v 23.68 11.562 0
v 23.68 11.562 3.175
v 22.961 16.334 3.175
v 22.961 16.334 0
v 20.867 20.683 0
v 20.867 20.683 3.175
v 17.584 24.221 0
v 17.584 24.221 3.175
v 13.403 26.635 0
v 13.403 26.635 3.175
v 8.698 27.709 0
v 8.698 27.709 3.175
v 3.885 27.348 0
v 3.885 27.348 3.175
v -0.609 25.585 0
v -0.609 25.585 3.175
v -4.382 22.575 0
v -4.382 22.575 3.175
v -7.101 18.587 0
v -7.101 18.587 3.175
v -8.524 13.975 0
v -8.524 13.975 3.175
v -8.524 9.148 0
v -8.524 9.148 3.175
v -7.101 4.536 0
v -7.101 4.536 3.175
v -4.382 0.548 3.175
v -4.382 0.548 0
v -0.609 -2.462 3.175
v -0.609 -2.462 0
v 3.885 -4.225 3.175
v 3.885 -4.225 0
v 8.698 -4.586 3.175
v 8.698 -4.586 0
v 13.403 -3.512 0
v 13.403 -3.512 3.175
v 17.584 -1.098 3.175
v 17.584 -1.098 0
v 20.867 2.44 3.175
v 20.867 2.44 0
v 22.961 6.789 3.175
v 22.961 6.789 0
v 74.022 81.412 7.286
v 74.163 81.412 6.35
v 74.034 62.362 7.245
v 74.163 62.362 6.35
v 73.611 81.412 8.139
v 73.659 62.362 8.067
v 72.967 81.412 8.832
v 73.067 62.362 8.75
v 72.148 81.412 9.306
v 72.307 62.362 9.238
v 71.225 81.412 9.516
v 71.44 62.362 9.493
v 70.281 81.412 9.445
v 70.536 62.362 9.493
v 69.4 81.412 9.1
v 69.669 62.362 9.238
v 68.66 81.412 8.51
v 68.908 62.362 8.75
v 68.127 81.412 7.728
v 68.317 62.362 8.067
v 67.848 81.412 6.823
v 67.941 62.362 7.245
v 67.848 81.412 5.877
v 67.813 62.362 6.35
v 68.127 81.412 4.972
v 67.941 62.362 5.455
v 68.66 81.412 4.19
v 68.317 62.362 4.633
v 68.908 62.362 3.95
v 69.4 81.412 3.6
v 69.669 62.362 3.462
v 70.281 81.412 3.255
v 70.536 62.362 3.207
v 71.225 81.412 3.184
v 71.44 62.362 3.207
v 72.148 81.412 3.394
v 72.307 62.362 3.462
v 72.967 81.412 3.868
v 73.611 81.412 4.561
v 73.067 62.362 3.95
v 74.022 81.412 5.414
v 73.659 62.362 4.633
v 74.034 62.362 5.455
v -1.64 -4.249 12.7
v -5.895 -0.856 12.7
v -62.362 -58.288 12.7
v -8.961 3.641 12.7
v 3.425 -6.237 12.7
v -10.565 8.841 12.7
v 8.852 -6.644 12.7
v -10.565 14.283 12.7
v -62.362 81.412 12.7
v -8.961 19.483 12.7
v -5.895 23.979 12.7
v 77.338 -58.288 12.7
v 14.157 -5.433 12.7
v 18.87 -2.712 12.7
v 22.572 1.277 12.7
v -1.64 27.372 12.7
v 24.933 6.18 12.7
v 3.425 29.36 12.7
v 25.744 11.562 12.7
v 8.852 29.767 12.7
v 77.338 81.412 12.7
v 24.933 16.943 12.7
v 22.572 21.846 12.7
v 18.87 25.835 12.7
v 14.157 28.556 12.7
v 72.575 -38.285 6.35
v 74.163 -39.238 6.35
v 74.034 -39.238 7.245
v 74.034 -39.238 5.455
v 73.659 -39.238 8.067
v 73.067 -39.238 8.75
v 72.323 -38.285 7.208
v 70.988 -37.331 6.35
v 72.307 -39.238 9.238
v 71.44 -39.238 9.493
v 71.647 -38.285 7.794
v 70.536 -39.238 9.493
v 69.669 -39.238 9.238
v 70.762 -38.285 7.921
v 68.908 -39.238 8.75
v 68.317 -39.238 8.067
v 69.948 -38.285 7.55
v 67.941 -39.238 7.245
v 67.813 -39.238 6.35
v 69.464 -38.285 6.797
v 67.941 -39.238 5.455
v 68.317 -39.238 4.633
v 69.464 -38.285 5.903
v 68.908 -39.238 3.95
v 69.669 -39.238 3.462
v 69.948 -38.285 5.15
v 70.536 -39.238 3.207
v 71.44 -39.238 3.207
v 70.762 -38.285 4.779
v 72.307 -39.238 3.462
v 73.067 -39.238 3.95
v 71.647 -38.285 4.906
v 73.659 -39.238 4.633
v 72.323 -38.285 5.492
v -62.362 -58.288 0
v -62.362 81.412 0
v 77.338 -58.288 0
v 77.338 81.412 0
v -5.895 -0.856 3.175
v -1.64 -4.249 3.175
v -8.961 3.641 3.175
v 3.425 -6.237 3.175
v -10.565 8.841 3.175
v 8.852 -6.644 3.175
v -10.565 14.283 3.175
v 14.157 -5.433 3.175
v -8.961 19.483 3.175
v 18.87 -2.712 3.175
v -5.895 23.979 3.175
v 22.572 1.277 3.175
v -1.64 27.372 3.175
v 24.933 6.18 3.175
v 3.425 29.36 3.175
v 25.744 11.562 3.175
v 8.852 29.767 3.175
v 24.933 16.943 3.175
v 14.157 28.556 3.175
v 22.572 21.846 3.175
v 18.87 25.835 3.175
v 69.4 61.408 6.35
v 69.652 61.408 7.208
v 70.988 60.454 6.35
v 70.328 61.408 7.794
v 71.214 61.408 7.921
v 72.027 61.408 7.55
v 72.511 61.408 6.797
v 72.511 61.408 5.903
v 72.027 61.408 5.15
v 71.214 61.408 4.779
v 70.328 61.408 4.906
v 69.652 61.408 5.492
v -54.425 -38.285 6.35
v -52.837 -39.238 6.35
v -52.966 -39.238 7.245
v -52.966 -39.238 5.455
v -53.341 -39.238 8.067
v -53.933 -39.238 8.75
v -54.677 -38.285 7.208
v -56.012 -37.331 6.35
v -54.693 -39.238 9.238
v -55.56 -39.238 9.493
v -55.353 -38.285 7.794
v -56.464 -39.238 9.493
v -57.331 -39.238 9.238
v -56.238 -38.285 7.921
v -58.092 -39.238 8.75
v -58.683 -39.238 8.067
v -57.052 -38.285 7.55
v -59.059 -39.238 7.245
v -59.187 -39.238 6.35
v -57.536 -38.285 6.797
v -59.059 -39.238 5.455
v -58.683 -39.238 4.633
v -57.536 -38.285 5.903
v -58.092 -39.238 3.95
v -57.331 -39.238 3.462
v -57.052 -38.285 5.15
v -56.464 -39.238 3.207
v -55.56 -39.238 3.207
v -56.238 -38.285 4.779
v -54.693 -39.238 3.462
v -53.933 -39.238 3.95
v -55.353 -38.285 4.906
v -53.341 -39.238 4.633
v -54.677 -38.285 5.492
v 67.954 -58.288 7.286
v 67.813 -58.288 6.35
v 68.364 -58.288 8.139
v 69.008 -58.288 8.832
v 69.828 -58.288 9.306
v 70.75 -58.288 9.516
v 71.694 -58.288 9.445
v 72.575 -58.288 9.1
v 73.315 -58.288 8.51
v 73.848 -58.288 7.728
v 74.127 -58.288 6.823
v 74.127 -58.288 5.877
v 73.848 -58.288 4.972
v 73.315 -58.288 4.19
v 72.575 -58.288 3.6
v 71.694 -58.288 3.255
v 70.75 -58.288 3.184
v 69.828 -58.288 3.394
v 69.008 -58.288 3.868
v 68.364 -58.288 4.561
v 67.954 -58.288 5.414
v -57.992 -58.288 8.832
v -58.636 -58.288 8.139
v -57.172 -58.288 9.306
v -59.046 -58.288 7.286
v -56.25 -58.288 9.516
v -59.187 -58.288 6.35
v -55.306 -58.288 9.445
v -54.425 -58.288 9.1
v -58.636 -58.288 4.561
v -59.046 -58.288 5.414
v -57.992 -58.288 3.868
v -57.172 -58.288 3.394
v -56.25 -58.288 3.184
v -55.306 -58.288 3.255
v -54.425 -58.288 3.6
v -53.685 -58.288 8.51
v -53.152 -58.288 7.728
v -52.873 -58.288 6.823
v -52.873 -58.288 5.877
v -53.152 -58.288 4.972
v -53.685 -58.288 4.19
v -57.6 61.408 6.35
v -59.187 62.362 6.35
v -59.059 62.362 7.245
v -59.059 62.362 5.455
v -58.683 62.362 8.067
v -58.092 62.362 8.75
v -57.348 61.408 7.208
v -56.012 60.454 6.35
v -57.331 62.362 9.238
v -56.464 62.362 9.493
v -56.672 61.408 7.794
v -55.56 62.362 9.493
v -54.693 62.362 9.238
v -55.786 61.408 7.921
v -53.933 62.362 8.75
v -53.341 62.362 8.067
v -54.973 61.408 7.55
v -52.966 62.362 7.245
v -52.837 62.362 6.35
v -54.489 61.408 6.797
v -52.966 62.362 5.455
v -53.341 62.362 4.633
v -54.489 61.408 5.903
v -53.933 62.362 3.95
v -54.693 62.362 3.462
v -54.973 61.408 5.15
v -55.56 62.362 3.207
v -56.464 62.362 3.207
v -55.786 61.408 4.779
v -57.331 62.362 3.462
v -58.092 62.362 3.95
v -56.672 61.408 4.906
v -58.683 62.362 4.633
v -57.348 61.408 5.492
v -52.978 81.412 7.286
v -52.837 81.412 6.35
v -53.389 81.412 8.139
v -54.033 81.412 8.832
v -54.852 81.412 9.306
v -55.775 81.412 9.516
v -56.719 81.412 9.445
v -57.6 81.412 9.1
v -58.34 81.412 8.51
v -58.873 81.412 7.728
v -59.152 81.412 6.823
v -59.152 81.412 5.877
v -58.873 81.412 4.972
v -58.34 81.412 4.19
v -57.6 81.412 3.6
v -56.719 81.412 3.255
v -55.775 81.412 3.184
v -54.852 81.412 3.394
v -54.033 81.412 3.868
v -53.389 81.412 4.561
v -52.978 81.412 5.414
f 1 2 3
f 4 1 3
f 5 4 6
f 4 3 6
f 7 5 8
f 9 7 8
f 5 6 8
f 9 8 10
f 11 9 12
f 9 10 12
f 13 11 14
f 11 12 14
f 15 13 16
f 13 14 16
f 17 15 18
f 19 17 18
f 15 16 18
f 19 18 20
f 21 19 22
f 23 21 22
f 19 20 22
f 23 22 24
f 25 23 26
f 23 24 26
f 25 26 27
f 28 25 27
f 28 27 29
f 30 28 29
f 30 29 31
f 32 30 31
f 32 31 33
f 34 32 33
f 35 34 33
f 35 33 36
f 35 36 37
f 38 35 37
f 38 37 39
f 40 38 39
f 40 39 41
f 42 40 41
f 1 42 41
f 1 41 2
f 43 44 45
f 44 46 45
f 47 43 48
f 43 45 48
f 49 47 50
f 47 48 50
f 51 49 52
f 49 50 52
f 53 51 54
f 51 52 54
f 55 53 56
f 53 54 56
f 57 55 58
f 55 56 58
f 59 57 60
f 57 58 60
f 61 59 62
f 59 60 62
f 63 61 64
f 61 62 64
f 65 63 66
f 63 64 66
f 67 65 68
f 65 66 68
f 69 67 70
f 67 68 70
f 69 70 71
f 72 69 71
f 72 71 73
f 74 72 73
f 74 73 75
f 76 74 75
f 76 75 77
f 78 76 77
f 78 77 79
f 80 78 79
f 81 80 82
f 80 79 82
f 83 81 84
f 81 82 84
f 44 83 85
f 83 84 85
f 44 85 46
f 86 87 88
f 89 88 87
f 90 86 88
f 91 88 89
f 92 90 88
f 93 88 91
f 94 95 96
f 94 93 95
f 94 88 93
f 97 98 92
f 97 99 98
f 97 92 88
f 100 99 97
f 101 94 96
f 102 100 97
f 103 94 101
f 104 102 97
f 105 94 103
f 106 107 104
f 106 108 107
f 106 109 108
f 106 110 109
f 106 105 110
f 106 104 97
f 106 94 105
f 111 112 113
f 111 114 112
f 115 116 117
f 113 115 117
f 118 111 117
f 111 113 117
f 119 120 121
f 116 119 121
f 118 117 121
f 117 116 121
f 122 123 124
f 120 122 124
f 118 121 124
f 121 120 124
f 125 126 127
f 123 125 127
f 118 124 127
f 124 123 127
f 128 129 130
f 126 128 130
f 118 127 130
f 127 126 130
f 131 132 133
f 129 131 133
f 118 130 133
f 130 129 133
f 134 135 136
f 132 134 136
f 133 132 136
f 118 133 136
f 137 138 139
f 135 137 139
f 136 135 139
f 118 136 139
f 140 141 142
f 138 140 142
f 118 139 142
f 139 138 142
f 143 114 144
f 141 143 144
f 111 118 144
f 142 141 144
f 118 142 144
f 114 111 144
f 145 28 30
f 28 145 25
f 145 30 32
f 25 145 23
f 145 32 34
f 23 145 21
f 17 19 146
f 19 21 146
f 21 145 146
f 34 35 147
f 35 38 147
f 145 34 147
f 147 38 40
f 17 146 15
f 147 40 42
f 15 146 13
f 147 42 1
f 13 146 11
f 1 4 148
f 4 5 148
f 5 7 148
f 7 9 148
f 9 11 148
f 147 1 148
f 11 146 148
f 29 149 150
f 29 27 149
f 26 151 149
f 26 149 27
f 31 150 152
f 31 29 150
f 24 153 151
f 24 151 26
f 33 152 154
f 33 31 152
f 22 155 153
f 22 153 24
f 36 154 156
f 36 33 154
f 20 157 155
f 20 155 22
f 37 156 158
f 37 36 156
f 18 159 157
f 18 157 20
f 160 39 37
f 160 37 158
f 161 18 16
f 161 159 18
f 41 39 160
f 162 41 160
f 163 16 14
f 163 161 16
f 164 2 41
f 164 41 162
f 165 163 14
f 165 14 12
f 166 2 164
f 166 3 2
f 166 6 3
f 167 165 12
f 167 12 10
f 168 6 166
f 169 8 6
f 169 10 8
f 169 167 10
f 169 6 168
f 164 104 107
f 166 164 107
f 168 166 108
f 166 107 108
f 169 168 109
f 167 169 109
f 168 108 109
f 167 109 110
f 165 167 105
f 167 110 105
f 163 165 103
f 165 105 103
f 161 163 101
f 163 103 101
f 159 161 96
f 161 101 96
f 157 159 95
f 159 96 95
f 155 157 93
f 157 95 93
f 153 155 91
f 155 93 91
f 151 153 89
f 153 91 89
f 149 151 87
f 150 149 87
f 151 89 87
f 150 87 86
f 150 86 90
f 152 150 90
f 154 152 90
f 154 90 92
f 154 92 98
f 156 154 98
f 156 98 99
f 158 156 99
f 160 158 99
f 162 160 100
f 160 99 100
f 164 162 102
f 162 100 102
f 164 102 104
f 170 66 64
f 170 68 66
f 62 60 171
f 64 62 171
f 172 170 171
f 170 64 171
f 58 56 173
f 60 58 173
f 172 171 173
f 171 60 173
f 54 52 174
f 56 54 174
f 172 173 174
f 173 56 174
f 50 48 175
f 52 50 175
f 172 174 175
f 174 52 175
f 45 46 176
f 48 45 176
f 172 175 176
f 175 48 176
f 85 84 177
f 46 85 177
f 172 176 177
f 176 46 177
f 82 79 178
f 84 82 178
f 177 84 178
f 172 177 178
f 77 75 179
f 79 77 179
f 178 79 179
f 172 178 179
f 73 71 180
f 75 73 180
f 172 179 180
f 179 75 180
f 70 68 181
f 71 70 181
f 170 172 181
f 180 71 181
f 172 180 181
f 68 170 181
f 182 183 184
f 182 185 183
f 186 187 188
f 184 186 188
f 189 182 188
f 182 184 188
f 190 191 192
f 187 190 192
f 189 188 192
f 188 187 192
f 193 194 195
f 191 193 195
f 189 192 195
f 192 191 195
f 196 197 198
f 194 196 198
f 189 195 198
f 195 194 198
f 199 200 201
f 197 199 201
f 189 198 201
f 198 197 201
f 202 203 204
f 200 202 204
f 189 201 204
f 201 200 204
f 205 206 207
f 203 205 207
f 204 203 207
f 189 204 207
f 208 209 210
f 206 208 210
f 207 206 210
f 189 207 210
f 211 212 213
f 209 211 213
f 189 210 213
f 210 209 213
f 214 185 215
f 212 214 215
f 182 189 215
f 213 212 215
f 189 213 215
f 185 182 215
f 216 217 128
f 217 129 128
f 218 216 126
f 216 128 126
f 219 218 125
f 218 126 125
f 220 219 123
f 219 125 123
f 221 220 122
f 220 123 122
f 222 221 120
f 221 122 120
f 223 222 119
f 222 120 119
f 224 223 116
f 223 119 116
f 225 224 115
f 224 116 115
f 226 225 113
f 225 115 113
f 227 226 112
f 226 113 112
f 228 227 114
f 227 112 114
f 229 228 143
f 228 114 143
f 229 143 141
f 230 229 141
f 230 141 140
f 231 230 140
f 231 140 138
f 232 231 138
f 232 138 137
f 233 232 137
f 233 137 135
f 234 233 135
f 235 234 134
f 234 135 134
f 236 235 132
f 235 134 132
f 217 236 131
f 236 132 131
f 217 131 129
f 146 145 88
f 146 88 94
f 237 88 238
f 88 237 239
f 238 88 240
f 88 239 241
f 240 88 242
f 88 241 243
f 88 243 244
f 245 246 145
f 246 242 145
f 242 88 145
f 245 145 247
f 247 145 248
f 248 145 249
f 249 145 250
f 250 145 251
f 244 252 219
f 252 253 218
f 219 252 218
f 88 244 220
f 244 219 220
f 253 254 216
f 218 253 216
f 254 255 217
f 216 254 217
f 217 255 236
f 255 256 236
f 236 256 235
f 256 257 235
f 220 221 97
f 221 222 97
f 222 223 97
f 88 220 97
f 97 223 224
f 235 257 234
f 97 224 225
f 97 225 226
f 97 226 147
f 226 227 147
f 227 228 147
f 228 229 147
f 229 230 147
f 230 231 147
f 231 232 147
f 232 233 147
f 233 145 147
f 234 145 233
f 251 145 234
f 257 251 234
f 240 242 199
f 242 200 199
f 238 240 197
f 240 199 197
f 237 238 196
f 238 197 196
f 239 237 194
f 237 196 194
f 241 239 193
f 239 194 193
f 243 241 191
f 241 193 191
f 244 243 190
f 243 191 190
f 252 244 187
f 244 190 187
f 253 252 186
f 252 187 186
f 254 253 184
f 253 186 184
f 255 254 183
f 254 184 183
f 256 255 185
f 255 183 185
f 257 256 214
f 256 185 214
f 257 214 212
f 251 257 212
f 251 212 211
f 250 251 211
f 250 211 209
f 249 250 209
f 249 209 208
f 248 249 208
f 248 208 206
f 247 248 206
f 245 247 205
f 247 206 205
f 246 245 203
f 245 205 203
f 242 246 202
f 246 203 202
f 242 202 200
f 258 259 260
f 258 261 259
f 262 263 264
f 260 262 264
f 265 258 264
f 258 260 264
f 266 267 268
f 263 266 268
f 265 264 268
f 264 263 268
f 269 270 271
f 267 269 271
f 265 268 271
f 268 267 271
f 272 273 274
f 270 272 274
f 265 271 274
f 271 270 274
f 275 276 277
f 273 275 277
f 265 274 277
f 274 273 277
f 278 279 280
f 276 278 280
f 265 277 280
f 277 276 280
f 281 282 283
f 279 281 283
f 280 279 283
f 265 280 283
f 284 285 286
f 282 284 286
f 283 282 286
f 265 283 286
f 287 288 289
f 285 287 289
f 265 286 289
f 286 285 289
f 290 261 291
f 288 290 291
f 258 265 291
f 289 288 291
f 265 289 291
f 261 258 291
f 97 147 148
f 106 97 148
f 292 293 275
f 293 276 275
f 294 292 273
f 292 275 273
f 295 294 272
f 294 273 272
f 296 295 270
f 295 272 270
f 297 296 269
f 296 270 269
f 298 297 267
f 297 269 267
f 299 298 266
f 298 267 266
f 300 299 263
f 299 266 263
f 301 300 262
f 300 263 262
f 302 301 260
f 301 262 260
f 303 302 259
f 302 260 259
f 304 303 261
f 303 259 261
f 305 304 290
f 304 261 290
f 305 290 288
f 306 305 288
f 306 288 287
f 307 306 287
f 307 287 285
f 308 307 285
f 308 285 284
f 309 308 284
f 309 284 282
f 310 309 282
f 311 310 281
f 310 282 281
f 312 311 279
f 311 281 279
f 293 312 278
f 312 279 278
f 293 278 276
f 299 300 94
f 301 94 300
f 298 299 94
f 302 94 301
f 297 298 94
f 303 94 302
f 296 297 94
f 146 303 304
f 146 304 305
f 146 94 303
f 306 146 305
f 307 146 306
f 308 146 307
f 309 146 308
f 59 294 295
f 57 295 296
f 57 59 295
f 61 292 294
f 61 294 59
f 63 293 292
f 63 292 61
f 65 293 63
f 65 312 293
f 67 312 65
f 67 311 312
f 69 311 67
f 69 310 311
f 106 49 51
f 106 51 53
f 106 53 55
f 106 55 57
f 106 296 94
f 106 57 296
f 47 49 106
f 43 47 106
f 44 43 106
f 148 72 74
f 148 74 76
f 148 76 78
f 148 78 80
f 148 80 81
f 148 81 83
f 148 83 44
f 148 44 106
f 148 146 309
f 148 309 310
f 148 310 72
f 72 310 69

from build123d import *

# Parameters (mm, degrees)
F0_W           = 139.7
F0_H           = 139.7
F1_DEPTH       = 12.7
F2_R           = 18.25625
F2_R_2         = 16.1925
F3_DEPTH       = 9.525
F4_DEPTH       = 25.4
F7_D           = 6.35
F7_DEPTH       = 19.05
F7_TIP         = 1.9077324654
F7_ON_F6_D     = 6.35
F7_ON_F6_DEPTH = 19.05
F7_ON_F6_TIP   = 1.9077324654


with BuildPart() as f1:
    # F0 (on Top) → F1 (new body)
    with BuildSketch(Plane.XY):
        with Locations((7.4876705185, 11.5616054587)):
            Rectangle(F0_W, F0_H)
    extrude(amount=F1_DEPTH)

    # F2 (on face) → F3 (cut)
    with BuildSketch(Plane.XY.offset(12.7)):
        with Locations((7.4876705185, 11.5616054587)):
            Circle(F2_R)
        with Locations((7.4876705185, 11.5616054587)):
            Circle(F2_R_2, mode=Mode.SUBTRACT)
    extrude(amount=-F3_DEPTH, mode=Mode.SUBTRACT)

    # F4 (cut): a face of the model
    f4_faces = [f1.faces().sort_by_distance(p)[0] for p in [
        (7.4876705185, 11.5616054587, 12.7),
    ]]
    extrude(f4_faces, amount=-F4_DEPTH, mode=Mode.SUBTRACT)

    # F7
    with Locations(Plane.XZ.offset(58.2883945413)):
        with Locations((-56.0123294815, 6.35), (70.9876705185, 6.35)):
            Hole(F7_D / 2, depth=F7_DEPTH)
            with Locations((0, 0, -(F7_DEPTH + F7_TIP / 2))):  # 118° drill point
                Cone(0, F7_D / 2, F7_TIP, mode=Mode.SUBTRACT)

    # F7 on F6
    with Locations(Plane(origin=(0, 81.4116054587, 0), x_dir=(-1, 0, 0), z_dir=(0, 1, 0))):
        with Locations((-70.9876705185, 6.35), (56.0123294815, 6.35)):
            Hole(F7_ON_F6_D / 2, depth=F7_ON_F6_DEPTH)
            with Locations((0, 0, -(F7_ON_F6_DEPTH + F7_ON_F6_TIP / 2))):  # 118° drill point
                Cone(0, F7_ON_F6_D / 2, F7_ON_F6_TIP, mode=Mode.SUBTRACT)


solid = f1.part
